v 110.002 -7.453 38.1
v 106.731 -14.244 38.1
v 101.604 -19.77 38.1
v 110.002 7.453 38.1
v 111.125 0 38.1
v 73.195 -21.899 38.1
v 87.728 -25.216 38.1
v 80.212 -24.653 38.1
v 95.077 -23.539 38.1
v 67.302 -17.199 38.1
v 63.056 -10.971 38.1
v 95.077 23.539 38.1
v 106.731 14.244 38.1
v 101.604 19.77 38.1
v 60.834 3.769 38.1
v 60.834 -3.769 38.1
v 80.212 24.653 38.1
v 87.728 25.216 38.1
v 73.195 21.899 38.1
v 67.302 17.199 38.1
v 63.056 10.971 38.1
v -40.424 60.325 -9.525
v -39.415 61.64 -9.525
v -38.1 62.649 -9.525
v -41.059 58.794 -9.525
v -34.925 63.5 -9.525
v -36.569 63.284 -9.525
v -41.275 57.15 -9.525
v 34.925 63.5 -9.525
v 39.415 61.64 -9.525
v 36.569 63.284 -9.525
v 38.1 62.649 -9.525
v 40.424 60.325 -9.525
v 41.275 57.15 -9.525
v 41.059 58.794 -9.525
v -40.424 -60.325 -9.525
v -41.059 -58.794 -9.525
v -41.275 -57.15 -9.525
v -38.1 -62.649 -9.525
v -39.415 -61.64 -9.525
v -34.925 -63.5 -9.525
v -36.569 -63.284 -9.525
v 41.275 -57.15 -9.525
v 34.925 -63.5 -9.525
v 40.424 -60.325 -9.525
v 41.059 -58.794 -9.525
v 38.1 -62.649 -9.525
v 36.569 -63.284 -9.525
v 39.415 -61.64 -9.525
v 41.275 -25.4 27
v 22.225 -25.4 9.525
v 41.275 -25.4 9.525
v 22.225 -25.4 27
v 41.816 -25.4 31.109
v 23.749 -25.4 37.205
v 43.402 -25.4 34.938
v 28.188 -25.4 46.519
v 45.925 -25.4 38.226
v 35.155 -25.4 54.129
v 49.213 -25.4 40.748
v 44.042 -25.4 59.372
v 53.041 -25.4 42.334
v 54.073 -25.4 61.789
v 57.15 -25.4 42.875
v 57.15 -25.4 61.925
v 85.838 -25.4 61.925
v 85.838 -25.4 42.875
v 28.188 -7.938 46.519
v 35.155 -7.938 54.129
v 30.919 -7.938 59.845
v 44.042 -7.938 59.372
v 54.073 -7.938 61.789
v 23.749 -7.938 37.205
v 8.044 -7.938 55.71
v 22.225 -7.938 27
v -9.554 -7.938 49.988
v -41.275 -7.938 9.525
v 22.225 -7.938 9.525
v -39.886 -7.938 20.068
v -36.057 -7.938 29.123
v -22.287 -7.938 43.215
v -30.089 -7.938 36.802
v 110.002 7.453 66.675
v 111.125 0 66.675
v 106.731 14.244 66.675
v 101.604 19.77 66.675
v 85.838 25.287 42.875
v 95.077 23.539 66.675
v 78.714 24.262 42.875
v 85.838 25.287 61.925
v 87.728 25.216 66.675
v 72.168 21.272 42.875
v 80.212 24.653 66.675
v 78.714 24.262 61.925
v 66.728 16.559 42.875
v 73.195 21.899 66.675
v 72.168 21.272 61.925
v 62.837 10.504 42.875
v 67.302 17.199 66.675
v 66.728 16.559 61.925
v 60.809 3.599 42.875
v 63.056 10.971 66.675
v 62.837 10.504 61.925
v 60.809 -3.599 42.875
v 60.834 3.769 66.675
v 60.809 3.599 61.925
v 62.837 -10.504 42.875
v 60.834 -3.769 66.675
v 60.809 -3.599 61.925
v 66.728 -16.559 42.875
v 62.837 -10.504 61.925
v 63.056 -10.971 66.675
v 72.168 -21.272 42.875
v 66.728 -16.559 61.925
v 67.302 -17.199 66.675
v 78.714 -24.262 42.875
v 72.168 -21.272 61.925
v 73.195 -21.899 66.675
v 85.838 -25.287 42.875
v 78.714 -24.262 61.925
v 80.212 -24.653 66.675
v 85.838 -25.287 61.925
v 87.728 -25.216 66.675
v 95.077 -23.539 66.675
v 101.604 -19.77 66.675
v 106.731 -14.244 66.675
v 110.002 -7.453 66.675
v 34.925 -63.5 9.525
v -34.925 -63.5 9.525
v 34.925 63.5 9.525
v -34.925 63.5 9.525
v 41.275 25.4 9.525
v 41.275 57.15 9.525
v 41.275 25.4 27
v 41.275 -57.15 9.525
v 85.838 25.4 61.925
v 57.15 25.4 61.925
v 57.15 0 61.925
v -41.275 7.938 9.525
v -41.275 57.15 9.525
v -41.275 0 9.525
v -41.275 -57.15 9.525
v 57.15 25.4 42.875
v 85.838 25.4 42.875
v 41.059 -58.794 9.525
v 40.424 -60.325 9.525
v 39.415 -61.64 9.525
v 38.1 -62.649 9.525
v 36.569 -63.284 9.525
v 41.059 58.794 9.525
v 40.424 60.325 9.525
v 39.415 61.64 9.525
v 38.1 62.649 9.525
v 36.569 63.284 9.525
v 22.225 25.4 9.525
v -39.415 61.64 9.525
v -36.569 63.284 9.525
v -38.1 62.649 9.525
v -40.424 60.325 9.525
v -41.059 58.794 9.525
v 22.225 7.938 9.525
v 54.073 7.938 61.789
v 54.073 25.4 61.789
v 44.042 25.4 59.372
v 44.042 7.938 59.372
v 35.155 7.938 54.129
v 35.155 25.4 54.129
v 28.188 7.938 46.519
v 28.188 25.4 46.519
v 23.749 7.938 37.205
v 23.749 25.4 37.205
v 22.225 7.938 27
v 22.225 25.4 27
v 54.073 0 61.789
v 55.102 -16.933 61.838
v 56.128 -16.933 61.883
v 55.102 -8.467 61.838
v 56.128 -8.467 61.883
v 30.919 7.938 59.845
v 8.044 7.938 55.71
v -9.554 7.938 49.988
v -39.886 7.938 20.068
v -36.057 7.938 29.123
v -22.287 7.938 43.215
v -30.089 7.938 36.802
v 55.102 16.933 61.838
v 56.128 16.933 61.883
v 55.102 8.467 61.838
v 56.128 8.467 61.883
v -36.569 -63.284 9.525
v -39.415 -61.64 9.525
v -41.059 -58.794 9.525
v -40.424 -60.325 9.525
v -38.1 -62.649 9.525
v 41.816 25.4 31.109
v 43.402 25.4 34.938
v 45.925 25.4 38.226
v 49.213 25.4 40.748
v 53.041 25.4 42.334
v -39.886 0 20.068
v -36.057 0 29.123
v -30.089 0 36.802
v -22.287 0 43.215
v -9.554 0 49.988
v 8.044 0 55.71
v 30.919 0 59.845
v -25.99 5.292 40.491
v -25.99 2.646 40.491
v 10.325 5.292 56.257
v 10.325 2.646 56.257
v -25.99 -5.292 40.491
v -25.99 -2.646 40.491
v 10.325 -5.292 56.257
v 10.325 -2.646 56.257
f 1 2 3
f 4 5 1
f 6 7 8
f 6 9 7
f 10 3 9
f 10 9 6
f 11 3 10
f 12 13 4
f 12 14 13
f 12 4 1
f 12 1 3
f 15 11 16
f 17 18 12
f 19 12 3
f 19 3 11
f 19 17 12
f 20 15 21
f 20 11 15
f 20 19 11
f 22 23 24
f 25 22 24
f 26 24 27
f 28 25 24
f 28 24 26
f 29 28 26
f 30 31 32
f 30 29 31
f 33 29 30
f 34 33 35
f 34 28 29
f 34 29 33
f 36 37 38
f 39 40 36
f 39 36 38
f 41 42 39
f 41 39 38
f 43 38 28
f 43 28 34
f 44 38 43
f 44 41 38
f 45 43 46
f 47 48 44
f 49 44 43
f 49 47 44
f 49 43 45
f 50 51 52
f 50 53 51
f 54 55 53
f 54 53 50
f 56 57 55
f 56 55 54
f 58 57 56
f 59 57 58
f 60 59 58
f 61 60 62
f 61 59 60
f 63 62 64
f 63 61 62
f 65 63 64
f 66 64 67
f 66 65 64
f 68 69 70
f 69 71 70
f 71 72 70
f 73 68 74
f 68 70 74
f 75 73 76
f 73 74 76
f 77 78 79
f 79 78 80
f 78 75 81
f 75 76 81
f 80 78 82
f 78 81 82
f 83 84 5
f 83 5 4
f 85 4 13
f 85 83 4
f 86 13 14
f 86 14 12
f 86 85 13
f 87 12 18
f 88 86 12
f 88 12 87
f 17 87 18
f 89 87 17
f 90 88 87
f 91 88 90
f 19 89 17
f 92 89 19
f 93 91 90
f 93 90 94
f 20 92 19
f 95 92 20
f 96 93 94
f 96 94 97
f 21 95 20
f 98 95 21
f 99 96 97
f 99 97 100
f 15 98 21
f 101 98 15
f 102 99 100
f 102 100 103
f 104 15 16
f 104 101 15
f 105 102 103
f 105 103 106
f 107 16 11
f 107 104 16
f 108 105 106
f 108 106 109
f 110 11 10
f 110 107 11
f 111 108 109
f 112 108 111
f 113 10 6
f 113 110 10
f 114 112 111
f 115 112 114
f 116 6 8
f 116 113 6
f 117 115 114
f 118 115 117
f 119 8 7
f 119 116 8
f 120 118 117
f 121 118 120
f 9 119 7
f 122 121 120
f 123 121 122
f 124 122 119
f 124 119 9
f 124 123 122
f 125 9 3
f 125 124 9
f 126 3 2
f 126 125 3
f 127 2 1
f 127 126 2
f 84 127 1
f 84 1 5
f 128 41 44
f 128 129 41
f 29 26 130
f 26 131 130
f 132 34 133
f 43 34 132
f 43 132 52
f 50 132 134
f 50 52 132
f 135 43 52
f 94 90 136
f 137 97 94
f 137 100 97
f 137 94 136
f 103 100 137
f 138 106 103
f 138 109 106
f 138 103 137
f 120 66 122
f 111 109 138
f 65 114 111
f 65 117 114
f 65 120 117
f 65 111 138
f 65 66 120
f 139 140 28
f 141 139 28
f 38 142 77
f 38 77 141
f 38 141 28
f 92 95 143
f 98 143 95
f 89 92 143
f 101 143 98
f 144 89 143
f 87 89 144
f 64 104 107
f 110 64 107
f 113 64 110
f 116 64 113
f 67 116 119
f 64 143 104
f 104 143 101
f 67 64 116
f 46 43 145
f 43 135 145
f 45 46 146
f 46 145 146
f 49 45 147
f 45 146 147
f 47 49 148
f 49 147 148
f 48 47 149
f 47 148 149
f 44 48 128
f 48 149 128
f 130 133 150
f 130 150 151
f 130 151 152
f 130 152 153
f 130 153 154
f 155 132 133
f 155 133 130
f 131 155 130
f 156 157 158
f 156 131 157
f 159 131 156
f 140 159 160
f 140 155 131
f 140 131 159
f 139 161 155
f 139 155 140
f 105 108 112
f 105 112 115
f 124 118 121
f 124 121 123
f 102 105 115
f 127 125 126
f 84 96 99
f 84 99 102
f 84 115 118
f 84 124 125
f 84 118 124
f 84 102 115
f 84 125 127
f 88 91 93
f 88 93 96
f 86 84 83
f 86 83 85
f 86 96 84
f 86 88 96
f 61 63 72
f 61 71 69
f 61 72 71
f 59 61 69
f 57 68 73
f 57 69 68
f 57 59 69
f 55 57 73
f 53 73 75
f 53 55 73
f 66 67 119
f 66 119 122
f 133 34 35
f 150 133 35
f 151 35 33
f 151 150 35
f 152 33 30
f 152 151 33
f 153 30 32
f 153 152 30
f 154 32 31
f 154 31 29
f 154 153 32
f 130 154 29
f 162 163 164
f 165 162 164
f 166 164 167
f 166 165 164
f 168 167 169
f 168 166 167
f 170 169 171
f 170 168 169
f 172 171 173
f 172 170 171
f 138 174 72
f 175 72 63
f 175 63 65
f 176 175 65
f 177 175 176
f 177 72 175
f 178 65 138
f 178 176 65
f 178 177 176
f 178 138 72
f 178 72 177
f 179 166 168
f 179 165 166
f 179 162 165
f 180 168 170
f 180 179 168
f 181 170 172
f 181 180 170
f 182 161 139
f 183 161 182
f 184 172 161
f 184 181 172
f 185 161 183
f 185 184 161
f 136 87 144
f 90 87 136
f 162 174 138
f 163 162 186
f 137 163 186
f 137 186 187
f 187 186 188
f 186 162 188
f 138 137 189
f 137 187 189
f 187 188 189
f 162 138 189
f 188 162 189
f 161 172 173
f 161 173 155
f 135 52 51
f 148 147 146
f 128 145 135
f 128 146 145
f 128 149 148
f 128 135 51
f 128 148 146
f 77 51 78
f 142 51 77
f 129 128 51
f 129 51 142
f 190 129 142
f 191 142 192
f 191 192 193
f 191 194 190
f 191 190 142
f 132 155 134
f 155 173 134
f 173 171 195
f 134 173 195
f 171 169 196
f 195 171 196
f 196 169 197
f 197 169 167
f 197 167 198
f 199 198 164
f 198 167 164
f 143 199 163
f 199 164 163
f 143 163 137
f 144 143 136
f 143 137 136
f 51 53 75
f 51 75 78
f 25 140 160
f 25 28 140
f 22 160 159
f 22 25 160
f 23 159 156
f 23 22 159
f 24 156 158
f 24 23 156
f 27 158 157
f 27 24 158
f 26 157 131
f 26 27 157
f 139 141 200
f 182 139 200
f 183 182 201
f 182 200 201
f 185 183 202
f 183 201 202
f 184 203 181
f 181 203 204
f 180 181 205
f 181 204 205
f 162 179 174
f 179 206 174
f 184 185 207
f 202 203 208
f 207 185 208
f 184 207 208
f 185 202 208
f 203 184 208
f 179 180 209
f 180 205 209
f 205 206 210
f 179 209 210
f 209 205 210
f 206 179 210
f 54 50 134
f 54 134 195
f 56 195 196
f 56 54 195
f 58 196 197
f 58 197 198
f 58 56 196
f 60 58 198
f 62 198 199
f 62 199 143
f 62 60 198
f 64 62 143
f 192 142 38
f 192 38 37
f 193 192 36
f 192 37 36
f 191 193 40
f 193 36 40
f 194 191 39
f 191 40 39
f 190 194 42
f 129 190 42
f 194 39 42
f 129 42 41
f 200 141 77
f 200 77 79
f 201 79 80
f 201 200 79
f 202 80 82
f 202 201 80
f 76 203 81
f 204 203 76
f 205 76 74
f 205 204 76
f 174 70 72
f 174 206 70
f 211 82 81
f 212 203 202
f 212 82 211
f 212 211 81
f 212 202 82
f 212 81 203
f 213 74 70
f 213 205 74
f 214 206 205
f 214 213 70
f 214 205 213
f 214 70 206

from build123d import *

# Parameters (mm, degrees)
F1_DEPTH = 63.5
F0_W     = 25.5134466434
F0_H     = 19.05
F2_DEPTH = 25.4
F3_DEPTH = 7.9375
F5_R     = 6.35


with BuildPart() as f1:
    # F0 (on Front) → F1 (new body, symmetric)
    with BuildSketch(Plane.XZ):
        Polygon((-41.275, -9.525), (41.275, -9.525), (41.275, 9.525), (22.225, 9.525), (-41.275, 9.525), align=None)
    extrude(amount=F1_DEPTH, both=True)

    # F0 (on Front) → F2 (join, symmetric)
    with BuildSketch(Plane.XZ):
        with BuildLine():
            Line((22.225, 9.525), (41.275, 9.525))
            Line((41.275, 9.525), (41.275, 12.7119745847))
            Line((41.275, 12.7119745847), (41.275, 27.0002))
            ThreePointArc((41.275, 27.0002), (45.9246798487, 38.2255201513), (57.15, 42.8752))
            Line((57.15, 42.8752), (60.325, 42.8752))
            Line((60.325, 42.8752), (60.325, 61.9252))
            Line((60.325, 61.9252), (57.15, 61.9252))
            add(Edge.make_bspline(
                [(54.0725699176, 61.7893513131), (55.1039994103, 61.839092438), (56.1300922565, 61.8842720565), (57.15, 61.9252)],
                knots=[108.8885339736, 108.8885339736, 108.8885339736, 108.8885339736, 111.5045361635, 111.5045361635, 111.5045361635, 111.5045361635], degree=3))
            ThreePointArc((54.0725699176, 61.7893513131), (31.3892268107, 50.5827823371), (22.225, 27.0002))
            Line((22.225, 27.0002), (22.225, 12.7119745847))
            Line((22.225, 12.7119745847), (22.225, 9.525))
        make_face()
        with Locations((73.0817233217, 52.4002)):
            Rectangle(F0_W, F0_H)
    extrude(amount=F2_DEPTH, both=True)

    # F0 (on Front) → F3 (join, symmetric)
    with BuildSketch(Plane.XZ):
        with BuildLine():
            add(Edge.make_bspline(
                [(-41.275, 9.525), (-41.0379751962, 49.7454198065), (11.1403255218, 59.7189256133), (54.0725699176, 61.7893513131)],
                knots=[0, 0, 0, 0, 108.8885339736, 108.8885339736, 108.8885339736, 108.8885339736], degree=3))
            Line((-41.275, 9.525), (22.225, 9.525))
            Line((22.225, 9.525), (22.225, 12.7119745847))
            Line((22.225, 12.7119745847), (22.225, 27.0002))
            ThreePointArc((22.225, 27.0002), (31.3892268107, 50.5827823371), (54.0725699176, 61.7893513131))
        make_face()
    extrude(amount=F3_DEPTH, both=True)

    # F0 (on Front) → F4 (revolve)
    with BuildSketch(Plane.XZ):
        Polygon((85.8384466434, 66.675), (85.8384466434, 61.9252), (85.8384466434, 42.8752), (85.8384466434, 38.1), (111.125, 38.1), (111.125, 66.675), align=None)
    revolve(axis=Axis((85.8384466434, 0, 52.3875), (0, 0, 1)))

    # F5
    f5_edges = [f1.edges().sort_by_distance(p)[0] for p in [
        (41.275, -63.5, 0),
        (-41.275, -63.5, 0),
        (-41.275, 63.5, 0),
        (41.275, 63.5, 0),
    ]]
    fillet(f5_edges, radius=F5_R)


solid = f1.part
